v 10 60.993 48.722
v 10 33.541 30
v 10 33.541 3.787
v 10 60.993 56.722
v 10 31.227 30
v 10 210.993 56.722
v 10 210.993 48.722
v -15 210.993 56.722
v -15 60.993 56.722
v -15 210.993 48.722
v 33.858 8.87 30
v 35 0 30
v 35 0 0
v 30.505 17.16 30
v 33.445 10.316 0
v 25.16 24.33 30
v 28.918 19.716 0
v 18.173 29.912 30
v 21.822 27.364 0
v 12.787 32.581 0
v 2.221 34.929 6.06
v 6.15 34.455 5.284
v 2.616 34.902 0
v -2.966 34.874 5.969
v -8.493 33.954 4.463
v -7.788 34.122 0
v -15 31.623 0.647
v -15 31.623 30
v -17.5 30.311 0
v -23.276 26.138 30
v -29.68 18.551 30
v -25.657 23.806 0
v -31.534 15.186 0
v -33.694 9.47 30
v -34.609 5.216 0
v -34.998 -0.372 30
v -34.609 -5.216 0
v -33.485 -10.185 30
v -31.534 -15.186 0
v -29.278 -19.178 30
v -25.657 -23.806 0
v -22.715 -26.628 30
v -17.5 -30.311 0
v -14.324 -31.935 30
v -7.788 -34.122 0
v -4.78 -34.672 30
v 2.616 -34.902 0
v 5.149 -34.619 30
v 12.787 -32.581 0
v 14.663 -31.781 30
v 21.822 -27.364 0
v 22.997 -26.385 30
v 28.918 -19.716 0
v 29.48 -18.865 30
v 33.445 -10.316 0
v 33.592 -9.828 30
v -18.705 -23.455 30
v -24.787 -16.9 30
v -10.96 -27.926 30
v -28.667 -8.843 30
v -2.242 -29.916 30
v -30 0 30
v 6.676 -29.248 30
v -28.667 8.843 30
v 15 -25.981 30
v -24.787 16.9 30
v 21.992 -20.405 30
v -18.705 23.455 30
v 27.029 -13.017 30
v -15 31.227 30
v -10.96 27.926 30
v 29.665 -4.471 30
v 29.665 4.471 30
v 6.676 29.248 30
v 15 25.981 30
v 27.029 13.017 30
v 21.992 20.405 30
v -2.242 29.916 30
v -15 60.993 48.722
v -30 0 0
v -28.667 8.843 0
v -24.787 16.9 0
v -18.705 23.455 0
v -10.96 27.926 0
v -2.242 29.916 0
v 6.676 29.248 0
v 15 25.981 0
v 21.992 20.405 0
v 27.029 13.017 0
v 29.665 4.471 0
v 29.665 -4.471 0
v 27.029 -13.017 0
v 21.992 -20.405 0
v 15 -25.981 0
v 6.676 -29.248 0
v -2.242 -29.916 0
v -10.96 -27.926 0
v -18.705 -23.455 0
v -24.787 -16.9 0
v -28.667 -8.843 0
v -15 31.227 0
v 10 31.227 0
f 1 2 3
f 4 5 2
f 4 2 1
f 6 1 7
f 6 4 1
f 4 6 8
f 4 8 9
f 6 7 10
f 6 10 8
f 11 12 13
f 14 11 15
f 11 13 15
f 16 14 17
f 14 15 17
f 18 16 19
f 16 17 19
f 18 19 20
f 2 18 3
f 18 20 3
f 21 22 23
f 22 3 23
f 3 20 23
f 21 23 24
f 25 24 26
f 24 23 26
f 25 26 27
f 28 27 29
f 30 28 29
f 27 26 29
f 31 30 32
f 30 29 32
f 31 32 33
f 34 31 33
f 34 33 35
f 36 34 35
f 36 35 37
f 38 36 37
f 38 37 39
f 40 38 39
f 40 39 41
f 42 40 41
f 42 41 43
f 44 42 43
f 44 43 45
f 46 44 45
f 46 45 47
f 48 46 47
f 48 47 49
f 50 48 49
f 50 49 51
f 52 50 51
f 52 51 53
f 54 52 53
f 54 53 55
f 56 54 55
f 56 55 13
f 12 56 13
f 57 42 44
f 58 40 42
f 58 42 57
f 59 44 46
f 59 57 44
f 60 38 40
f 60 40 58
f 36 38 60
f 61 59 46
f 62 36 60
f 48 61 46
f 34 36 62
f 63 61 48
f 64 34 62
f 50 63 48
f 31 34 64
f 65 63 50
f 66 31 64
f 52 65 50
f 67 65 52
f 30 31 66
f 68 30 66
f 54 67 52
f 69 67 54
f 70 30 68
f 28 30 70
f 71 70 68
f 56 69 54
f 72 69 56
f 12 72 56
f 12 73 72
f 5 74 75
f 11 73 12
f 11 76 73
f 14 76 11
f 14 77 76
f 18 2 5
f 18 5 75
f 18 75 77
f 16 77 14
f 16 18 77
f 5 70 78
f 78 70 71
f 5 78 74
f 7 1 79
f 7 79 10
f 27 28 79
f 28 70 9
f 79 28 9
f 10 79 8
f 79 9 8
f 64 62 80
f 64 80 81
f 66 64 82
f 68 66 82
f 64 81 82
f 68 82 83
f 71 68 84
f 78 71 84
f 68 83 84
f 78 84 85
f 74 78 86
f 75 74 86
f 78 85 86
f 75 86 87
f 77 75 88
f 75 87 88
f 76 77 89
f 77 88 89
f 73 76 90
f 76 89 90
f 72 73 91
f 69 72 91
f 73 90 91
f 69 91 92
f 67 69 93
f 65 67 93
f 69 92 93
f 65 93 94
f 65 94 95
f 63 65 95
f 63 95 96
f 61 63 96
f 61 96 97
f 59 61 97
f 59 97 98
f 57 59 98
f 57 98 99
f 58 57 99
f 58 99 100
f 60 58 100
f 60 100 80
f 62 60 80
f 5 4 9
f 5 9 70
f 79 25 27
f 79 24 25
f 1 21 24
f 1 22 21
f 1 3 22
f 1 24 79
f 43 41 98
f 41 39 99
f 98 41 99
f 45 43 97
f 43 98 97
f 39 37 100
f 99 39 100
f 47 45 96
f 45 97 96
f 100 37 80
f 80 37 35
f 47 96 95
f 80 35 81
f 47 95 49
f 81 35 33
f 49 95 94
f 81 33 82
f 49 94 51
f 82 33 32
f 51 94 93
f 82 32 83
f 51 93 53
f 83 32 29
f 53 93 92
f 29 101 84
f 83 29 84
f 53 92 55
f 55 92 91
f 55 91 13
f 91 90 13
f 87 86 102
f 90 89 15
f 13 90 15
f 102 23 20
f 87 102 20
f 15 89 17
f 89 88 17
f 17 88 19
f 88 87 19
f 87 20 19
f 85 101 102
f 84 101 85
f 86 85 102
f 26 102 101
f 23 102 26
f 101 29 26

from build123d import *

# Parameters (mm, degrees)
F0_R     = 35
F1_DEPTH = 30
F4_DEPTH = 25
F6_D     = 60


with BuildPart() as f1:
    # F0 (on Top) → F1 (new body)
    with BuildSketch(Plane.XY):
        Circle(F0_R)
    extrude(amount=F1_DEPTH)

    # F3 (on offset) → F4 (join)
    with BuildSketch(Plane.YZ.offset(10)):
        Polygon((31.227464, 30), (31.227464, 0), (60.99254, 48.721532), (210.99254, 48.721532), (210.99254, 56.721532), (60.99254, 56.721532), align=None)
    extrude(amount=-F4_DEPTH)

    # F6 (through all)
    with Locations(Plane.XY.offset(30)):
        with Locations((0, 0)):
            Hole(F6_D / 2)


solid = f1.part
